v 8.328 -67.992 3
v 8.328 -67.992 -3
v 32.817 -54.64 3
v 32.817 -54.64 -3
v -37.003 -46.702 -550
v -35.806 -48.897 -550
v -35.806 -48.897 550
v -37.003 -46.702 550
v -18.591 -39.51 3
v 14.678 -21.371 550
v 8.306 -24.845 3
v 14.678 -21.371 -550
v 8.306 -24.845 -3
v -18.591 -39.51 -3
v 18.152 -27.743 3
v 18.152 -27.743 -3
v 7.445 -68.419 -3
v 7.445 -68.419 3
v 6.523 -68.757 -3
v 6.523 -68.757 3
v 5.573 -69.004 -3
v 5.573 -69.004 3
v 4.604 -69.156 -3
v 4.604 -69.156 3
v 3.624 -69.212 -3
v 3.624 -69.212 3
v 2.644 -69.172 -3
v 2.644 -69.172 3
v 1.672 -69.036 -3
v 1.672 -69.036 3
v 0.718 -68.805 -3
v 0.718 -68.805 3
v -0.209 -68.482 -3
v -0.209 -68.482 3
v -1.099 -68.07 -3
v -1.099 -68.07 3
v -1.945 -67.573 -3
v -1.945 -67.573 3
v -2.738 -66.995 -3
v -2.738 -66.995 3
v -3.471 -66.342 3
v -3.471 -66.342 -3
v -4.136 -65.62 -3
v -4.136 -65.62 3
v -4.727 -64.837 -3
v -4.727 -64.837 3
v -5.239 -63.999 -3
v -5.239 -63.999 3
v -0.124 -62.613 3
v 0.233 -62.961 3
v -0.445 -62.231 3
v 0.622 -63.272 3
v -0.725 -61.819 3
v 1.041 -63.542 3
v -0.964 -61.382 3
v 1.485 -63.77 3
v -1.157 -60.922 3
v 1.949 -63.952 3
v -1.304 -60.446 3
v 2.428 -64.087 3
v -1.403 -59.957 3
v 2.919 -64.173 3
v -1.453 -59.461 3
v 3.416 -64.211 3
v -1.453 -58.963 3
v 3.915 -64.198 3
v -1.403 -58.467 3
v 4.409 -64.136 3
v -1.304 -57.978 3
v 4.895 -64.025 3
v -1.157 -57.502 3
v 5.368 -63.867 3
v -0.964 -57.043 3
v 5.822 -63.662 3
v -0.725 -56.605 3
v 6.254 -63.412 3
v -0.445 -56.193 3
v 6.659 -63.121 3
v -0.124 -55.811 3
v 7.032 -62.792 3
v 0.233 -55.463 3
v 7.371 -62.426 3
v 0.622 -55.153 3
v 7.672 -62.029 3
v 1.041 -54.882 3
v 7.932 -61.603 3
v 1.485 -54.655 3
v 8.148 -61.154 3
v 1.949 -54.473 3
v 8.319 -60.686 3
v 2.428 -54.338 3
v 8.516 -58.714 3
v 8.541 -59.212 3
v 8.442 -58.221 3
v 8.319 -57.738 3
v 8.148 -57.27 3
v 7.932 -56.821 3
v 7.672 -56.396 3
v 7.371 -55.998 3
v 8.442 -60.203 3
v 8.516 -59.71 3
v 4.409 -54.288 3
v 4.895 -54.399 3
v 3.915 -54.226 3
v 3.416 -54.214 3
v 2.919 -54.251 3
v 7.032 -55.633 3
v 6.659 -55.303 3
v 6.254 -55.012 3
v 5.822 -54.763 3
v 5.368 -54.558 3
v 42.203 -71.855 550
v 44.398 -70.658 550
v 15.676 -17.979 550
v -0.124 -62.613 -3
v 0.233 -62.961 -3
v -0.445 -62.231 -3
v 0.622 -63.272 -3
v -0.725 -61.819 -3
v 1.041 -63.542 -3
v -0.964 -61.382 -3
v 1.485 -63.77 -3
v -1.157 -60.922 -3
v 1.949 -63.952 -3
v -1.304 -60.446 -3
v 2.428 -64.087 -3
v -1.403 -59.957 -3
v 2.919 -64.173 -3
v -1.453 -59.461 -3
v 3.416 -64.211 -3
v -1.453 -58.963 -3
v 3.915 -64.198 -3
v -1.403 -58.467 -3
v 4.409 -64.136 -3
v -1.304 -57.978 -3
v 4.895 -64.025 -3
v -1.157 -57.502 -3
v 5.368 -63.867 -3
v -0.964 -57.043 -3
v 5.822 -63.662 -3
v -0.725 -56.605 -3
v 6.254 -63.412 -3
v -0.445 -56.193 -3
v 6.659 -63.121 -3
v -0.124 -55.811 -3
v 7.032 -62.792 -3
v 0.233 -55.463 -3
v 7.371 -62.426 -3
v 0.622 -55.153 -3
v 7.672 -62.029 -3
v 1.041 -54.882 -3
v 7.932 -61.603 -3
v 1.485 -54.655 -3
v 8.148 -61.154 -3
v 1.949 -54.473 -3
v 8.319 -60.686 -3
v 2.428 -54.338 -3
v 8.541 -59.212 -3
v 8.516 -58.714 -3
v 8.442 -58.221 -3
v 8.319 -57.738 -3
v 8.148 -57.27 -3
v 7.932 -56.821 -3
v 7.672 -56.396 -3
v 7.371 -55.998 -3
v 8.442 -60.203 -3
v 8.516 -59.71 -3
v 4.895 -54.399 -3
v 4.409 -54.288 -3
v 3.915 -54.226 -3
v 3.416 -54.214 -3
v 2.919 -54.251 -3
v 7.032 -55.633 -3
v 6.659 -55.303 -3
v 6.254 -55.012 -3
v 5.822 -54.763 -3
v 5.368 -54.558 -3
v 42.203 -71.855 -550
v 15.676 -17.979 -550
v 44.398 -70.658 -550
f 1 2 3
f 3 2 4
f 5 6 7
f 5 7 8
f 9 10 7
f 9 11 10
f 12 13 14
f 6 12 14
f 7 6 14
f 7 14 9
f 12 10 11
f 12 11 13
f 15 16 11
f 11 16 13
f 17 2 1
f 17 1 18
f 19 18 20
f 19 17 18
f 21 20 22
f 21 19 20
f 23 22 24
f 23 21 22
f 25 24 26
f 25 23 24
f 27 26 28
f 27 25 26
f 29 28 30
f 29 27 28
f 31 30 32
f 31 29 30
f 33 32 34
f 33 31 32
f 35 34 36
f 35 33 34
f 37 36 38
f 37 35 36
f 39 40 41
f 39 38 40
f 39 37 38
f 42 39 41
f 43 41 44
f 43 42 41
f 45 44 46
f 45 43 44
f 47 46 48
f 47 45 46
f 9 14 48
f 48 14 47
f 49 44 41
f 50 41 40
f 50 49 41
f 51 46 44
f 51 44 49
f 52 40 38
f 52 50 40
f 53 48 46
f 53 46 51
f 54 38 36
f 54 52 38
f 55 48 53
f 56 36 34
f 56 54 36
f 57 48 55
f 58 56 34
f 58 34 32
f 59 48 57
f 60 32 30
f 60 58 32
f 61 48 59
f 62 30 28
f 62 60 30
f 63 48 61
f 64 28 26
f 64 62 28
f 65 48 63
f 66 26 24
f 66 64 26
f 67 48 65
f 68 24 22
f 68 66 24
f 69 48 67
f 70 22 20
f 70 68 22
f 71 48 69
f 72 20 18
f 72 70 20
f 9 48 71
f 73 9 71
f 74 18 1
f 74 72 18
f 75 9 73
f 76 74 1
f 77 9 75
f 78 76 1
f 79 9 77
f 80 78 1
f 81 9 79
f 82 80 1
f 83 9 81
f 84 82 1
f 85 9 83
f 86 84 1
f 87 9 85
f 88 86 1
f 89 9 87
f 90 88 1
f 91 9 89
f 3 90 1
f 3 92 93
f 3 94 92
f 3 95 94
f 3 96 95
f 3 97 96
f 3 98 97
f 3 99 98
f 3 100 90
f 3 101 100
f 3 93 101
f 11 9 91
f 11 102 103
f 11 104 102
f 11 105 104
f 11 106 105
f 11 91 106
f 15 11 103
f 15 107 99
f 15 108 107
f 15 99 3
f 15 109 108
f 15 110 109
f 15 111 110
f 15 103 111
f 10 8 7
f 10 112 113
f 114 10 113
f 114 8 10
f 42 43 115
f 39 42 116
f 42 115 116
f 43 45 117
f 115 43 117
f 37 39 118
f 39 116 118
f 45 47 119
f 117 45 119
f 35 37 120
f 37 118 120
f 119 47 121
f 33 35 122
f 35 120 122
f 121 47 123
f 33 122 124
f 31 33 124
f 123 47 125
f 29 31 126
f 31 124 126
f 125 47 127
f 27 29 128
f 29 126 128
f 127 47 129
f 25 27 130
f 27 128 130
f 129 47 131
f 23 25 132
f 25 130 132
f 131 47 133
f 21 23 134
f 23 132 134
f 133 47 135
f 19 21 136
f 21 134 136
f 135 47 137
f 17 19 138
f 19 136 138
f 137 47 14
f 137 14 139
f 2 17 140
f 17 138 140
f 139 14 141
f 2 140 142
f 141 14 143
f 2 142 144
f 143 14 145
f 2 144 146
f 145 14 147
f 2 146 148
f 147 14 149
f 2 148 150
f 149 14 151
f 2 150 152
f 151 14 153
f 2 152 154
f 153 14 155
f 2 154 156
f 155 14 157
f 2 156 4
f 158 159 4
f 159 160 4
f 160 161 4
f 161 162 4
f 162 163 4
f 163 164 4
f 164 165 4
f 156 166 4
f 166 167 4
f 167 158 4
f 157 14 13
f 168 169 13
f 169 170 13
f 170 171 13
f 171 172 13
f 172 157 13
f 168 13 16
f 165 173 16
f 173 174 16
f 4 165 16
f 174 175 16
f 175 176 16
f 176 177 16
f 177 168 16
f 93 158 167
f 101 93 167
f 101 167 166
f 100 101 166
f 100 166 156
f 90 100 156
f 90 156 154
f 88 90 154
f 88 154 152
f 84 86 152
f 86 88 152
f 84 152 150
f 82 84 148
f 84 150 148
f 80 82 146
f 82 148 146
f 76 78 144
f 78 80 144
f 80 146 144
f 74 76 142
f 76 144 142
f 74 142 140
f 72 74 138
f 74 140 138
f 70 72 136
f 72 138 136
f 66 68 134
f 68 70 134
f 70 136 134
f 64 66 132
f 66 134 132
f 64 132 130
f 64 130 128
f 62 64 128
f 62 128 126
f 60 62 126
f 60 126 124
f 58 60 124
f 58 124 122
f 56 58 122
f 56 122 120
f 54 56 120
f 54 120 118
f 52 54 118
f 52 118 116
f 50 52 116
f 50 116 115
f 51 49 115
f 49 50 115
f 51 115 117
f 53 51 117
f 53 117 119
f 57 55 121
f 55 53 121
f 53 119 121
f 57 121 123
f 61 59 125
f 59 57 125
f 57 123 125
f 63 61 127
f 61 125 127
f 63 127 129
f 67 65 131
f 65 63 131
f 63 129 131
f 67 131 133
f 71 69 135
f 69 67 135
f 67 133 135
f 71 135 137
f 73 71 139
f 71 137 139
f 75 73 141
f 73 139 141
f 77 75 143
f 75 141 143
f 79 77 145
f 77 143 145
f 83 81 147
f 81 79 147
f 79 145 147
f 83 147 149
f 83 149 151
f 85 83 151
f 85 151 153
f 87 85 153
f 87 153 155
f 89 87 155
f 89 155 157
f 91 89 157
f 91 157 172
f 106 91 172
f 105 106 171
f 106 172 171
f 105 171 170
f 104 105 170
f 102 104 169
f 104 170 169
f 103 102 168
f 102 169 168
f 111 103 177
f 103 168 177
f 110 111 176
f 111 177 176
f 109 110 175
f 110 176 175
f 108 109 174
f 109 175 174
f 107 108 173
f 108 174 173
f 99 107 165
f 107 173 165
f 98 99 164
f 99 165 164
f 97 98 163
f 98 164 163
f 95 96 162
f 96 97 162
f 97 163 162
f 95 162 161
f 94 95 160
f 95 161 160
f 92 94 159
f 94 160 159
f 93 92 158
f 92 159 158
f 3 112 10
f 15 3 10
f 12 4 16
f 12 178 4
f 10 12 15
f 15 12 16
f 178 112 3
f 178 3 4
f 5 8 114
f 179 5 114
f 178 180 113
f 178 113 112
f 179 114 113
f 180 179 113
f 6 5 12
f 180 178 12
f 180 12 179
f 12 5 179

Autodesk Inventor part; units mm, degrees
ref_plane "YZ Plane" through (0, 0, 0) normal (1, 0, 0) x (0, 1, 0)
ref_plane "XZ Plane" through (0, 0, 0) normal (0, 1, 0) x (-1, 0, 0)
ref_plane "XY Plane" through (0, 0, 0) normal (0, 0, 1) x (1, 0, 0)
sketch "Sketch1" plane through (0, 0, 0) normal (0, 0, 1) x (1, 0, 0)
  circle A0 centre (-76.4616, -331.0553) radius 285.0725 projected
  line L0 (42.2033, -71.8546) -> (14.6776, -21.3711)
  line L1 (14.6776, -21.3711) -> (-35.8059, -48.8968)
  line L2 (-35.8059, -48.8968) -> (-37.0027, -46.7018)
  line L3 (-37.0027, -46.7018) -> (15.6758, -17.9794)
  line L4 (15.6758, -17.9794) -> (44.3982, -70.6579)
  line L5 (44.3982, -70.6579) -> (42.2033, -71.8546)
  dimension "d15" = 2.5
  dimension "d16" = 60
extrude "Extrusion1" add sketch "Sketch1" along normal mid plane 1100 contours L0 L1 L2 L3 L4 L5
sketch "Sketch3" plane through (0, 0, 0) normal (0, 0, 1) x (1, 0, 0)
  circle A0 centre (3.5411, -59.2122) radius 5
  circle A1 centre (3.5411, -59.2122) radius 10
  line L0 (-35.8059, -48.8968) -> (14.6776, -21.3711) projected
  line L1 (14.6776, -21.3711) -> (42.2033, -71.8546) projected
  line L2 (8.3282, -67.992) -> (32.817, -54.6397)
  line L3 (32.817, -54.6397) -> (18.1516, -27.7427)
  line L4 (18.1516, -27.7427) -> (8.3061, -24.8451)
  line L5 (8.3061, -24.8451) -> (-18.591, -39.5105)
  line L6 (-18.591, -39.5105) -> (-5.2387, -63.9993)
  point P0 (0, 0)
  dimension "d21" = 10
  dimension "d22" = 20
extrude "Extrusion4" add sketch "Sketch3" along normal mid plane 6 contours A1 | A1 L6 L0 L4 L1 L2
properties part number "Barra freno"
